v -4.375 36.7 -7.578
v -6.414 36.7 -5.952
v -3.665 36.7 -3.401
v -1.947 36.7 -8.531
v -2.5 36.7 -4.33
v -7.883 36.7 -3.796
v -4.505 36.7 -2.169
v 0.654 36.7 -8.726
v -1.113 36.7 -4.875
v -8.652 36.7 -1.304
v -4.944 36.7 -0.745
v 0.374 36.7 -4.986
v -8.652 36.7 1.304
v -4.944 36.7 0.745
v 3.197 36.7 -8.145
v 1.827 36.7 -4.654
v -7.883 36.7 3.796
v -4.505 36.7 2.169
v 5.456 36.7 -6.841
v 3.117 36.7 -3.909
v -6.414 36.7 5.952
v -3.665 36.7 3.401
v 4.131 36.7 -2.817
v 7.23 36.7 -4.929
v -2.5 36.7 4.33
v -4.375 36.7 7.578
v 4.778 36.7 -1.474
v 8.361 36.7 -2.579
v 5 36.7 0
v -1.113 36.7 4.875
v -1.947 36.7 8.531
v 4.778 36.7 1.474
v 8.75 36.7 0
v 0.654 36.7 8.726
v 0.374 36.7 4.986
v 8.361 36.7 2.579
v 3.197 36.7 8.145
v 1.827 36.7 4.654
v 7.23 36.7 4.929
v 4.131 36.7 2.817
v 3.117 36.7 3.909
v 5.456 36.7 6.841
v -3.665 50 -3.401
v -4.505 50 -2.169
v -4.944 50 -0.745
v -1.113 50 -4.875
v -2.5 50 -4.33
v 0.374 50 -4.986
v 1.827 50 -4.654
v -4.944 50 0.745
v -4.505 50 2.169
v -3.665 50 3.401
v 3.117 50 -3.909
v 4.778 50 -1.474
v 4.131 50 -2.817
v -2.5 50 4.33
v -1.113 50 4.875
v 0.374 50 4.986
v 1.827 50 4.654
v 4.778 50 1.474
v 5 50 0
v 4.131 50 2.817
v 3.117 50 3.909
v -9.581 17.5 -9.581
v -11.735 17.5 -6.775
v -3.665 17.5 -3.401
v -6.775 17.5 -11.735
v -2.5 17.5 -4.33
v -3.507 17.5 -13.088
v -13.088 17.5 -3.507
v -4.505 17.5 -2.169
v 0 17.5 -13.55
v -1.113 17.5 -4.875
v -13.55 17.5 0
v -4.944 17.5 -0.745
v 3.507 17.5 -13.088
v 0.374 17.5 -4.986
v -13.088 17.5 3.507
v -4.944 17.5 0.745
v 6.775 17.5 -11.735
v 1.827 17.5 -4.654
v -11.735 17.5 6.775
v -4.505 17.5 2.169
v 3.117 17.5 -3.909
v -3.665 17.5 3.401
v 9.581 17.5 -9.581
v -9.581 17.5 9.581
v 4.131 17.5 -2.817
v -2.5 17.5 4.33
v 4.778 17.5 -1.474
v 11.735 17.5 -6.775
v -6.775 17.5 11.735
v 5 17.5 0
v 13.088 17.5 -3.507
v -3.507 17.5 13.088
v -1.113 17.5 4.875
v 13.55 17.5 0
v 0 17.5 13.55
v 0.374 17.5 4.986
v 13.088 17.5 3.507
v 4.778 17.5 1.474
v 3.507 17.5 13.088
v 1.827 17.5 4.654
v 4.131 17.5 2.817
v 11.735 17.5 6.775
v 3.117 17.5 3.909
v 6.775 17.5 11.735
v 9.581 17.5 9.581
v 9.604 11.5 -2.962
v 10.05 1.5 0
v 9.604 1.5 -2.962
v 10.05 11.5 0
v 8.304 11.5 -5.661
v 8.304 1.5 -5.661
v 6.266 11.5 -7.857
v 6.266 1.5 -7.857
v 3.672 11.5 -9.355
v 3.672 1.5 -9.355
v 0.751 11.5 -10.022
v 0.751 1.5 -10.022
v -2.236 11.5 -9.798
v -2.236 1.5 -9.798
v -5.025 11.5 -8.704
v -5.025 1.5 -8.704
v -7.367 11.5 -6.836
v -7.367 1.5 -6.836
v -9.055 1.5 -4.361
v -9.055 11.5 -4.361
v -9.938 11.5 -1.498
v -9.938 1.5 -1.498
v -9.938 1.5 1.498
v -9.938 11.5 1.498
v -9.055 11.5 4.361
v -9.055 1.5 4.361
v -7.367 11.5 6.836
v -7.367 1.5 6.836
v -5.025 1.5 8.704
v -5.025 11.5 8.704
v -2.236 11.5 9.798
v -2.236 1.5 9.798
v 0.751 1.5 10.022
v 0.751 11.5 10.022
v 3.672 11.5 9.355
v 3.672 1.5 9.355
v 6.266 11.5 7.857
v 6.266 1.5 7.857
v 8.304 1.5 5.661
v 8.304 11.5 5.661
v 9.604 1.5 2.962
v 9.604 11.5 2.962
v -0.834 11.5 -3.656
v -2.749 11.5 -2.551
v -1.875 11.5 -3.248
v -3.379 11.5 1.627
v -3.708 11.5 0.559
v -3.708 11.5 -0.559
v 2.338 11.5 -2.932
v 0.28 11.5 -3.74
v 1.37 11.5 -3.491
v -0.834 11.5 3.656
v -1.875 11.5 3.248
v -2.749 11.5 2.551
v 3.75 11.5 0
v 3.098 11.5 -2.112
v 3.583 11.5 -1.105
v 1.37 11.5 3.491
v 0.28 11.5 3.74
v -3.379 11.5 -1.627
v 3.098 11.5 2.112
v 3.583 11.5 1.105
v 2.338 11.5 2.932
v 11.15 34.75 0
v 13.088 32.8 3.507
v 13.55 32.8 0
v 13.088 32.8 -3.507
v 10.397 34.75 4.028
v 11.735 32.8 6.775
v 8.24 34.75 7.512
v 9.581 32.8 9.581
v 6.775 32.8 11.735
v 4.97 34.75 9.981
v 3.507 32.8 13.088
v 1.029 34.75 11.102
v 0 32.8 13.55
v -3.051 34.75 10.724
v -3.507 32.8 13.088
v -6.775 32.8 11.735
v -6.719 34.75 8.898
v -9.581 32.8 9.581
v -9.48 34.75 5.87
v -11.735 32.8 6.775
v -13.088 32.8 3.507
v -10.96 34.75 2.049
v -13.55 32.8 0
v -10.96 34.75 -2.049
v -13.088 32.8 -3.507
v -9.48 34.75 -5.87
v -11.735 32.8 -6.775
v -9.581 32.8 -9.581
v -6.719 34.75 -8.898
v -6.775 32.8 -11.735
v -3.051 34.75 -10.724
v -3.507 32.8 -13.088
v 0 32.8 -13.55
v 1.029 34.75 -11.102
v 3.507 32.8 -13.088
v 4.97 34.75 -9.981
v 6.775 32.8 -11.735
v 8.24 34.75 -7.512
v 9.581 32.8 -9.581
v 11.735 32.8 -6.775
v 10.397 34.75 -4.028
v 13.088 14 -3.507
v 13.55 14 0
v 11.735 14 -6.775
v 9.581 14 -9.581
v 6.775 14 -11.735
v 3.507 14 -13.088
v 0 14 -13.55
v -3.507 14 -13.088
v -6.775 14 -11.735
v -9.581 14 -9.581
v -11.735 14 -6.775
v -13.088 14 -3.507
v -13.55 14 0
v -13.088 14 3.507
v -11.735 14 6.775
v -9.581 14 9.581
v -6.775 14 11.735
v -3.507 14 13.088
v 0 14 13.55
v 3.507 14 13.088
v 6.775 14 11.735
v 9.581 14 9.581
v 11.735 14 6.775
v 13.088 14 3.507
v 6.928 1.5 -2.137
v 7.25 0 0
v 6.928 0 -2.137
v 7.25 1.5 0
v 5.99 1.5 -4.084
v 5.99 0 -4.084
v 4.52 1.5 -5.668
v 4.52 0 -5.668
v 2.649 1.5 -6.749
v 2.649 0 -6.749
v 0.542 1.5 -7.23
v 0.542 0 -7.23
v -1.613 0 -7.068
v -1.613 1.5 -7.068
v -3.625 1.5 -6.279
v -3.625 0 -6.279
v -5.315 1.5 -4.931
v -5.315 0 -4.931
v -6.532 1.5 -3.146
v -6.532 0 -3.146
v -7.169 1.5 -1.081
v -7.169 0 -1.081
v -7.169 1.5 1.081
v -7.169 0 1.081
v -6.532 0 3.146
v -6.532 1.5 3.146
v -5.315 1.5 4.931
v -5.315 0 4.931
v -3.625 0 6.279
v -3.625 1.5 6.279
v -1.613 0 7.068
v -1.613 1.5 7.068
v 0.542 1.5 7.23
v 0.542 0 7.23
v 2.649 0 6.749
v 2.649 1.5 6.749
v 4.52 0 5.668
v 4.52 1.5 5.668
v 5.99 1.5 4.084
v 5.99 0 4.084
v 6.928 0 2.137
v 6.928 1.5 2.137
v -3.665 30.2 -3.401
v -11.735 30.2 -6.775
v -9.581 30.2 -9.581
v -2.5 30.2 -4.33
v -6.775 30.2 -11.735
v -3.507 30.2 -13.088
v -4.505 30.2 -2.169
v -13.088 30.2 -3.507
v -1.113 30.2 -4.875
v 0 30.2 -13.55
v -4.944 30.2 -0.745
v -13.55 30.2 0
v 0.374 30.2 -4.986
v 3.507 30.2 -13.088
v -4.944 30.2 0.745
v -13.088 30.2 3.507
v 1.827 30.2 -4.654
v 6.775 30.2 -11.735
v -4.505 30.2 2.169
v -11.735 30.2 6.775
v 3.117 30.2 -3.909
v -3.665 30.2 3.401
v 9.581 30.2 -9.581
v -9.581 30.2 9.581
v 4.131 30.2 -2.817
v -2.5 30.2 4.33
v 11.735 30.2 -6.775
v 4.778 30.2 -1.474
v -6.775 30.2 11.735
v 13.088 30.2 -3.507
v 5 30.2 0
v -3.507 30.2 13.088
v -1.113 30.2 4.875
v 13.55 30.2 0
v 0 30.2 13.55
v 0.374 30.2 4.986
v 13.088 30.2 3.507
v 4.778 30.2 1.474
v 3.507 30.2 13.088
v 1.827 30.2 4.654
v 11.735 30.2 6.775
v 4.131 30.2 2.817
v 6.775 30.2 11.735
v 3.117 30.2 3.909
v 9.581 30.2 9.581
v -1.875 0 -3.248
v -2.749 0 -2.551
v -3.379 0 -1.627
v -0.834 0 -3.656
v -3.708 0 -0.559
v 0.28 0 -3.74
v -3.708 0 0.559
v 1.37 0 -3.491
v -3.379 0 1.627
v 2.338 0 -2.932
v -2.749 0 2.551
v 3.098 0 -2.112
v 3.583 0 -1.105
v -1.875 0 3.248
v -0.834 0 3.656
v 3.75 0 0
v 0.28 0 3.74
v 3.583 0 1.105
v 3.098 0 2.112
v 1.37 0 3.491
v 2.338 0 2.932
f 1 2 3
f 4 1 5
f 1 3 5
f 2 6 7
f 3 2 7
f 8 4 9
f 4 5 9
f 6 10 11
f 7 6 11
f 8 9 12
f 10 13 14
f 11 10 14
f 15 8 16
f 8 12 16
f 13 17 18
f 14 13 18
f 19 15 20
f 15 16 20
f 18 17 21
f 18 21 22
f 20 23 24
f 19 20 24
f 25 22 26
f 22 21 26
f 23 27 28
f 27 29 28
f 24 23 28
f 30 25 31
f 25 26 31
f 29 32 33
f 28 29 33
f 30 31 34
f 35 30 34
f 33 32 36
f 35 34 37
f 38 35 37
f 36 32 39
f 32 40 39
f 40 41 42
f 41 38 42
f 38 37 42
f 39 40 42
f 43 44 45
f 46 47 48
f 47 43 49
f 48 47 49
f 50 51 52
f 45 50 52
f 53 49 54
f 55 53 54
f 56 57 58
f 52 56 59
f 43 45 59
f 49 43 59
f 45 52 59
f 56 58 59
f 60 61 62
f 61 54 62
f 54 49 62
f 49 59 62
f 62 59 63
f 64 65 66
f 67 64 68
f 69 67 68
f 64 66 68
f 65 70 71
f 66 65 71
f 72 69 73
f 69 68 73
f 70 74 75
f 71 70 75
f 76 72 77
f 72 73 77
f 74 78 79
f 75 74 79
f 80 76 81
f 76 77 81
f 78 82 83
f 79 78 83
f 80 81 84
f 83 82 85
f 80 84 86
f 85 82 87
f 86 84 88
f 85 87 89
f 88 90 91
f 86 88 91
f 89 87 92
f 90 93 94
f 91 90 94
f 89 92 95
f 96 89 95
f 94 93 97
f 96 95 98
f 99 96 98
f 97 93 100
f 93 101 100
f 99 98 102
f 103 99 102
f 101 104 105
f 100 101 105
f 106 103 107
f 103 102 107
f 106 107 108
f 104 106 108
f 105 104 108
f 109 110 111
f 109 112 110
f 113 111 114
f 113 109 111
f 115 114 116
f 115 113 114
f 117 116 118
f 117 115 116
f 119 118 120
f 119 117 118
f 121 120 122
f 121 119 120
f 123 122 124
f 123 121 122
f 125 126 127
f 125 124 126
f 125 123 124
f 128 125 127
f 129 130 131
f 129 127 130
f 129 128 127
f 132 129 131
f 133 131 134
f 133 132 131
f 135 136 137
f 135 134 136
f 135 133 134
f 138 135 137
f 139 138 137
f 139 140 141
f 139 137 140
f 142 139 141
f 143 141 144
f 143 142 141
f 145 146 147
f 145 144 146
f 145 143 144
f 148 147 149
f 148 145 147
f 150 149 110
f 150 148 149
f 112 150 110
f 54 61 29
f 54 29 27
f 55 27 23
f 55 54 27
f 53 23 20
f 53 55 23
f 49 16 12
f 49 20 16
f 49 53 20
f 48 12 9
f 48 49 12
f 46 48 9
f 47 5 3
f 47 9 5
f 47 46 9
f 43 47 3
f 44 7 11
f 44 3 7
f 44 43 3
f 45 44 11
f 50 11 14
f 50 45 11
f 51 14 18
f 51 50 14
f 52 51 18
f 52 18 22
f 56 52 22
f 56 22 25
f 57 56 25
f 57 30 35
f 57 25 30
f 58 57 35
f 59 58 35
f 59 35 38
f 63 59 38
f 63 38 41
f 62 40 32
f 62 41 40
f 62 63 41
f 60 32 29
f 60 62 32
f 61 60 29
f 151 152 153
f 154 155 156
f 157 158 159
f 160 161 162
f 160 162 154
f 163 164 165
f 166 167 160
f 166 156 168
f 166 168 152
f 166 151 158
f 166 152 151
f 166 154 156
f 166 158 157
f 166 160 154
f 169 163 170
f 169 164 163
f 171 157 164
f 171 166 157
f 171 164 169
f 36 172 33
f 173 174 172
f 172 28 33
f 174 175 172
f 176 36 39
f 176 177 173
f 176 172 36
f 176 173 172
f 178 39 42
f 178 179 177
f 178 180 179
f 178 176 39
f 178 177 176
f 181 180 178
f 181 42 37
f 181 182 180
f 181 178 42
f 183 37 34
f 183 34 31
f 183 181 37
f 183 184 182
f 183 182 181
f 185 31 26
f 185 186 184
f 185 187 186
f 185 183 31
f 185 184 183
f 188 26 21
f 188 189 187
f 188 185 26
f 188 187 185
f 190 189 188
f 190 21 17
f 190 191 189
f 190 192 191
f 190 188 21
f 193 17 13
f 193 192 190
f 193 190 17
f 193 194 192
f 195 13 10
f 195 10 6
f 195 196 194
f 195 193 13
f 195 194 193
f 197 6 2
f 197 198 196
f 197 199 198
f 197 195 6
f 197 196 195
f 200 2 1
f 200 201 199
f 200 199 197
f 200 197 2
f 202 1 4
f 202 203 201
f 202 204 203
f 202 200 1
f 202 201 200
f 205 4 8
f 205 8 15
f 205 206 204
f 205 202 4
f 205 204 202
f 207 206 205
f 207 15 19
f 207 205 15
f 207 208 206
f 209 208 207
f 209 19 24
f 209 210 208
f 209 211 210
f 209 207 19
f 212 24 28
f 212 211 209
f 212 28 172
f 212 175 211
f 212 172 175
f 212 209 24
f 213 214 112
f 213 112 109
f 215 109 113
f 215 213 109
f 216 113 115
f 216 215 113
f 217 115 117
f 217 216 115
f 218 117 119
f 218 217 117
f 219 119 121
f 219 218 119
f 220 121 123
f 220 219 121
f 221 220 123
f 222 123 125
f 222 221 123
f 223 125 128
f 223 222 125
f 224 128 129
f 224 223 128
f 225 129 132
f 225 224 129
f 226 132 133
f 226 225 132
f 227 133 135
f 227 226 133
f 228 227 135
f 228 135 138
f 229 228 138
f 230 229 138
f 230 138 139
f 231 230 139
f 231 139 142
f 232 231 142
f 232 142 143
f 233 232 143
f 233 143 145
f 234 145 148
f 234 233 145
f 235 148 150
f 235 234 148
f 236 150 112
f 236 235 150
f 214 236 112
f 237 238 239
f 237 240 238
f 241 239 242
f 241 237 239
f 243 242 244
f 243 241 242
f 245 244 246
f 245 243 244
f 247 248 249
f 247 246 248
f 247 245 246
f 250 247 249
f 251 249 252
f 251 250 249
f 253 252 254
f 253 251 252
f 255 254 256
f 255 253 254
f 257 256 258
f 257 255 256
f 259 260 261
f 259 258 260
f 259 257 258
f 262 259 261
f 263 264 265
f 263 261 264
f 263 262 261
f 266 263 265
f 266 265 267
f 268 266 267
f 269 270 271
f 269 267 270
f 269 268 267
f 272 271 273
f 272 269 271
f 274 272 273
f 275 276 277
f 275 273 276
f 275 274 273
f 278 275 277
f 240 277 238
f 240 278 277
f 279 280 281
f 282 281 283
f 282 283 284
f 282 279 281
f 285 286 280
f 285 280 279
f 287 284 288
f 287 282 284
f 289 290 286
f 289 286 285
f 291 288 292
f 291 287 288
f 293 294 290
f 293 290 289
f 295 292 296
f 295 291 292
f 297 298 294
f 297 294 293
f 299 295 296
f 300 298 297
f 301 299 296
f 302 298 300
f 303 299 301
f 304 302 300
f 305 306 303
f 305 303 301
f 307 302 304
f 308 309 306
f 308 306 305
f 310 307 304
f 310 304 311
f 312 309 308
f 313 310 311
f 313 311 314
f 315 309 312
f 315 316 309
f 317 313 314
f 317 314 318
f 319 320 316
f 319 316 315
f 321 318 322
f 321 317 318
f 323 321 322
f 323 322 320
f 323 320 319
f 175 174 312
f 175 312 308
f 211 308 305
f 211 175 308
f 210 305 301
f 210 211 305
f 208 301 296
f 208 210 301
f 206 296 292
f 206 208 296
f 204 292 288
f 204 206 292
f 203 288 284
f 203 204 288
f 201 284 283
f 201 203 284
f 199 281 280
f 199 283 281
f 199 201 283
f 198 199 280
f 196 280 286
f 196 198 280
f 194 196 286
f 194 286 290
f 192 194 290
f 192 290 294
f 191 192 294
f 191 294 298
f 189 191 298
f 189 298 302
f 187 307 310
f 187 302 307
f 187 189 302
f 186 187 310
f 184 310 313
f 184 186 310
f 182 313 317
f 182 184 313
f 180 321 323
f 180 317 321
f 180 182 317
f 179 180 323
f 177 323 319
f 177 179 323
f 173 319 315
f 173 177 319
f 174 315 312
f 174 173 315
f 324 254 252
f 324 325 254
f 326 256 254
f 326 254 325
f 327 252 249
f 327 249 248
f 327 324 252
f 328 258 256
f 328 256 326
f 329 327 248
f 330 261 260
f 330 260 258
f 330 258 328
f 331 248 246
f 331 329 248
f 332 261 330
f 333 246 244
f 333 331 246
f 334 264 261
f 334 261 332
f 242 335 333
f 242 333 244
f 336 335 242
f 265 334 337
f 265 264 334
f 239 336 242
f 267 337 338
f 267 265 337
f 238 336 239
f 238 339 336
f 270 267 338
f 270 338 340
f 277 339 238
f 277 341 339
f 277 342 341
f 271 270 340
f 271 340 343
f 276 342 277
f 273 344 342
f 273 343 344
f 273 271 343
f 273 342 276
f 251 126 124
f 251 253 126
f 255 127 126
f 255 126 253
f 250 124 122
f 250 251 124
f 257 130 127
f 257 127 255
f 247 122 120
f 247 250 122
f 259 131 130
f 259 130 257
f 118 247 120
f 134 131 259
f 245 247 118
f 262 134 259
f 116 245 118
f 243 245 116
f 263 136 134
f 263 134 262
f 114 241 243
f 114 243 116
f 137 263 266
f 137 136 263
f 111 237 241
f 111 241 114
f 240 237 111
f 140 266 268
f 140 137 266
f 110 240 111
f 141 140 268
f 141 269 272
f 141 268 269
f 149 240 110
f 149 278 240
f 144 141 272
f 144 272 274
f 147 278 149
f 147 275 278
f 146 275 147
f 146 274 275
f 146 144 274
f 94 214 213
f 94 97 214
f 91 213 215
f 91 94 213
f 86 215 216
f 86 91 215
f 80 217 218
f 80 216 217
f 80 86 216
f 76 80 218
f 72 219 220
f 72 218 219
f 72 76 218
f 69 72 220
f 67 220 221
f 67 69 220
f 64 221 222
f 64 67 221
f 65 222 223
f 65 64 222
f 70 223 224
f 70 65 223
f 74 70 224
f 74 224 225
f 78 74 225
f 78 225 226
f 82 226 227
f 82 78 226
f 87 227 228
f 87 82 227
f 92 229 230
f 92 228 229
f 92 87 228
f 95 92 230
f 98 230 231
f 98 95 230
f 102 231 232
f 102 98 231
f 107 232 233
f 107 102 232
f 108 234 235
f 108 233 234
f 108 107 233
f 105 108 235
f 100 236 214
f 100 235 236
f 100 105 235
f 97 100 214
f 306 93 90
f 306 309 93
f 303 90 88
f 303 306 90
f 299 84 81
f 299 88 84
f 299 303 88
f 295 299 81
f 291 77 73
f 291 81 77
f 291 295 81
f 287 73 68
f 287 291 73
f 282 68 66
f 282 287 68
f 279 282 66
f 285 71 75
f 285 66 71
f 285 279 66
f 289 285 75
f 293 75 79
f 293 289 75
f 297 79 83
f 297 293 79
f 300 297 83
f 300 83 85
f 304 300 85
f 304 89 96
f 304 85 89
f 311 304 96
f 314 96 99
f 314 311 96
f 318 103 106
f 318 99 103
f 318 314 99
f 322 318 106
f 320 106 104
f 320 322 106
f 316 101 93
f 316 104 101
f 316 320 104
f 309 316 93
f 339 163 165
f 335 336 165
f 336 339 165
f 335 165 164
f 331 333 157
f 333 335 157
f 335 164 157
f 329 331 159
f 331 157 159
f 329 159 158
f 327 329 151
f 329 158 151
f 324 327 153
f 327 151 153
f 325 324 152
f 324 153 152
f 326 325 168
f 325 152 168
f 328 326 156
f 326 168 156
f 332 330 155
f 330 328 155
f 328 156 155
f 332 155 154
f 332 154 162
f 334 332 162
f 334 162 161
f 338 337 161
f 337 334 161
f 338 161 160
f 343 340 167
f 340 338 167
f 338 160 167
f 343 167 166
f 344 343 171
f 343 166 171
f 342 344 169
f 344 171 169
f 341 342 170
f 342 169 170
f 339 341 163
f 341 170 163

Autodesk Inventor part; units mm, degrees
ref_plane "YZ Plane" through (0, 0, 0) normal (1, 0, 0) x (0, 1, 0)
ref_plane "XZ Plane" through (0, 0, 0) normal (0, 1, 0) x (-1, 0, 0)
ref_plane "XY Plane" through (0, 0, 0) normal (0, 0, 1) x (1, 0, 0)
sketch "Sketch1" plane through (0, 0, 0) normal (0, 0, 1) x (1, 0, 0)
  line L0 (3.75, 0) -> (7.25, 0)
  line L1 (7.25, 0) -> (7.25, 1.5)
  line L2 (7.25, 1.5) -> (10.05, 1.5)
  line L3 (10.05, 1.5) -> (10.05, 11.5)
  line L4 (10.05, 11.5) -> (13.55, 14)
  line L5 (13.55, 14) -> (13.55, 17.5)
  line L6 (13.55, 17.5) -> (5, 17.5)
  line L7 (5, 17.5) -> (5, 30.2)
  line L8 (5, 30.2) -> (13.55, 30.2)
  line L9 (13.55, 30.2) -> (13.55, 32.8)
  line L10 (13.55, 32.8) -> (8.75, 36.7)
  line L11 (8.75, 36.7) -> (5, 36.7)
  line L12 (5, 36.7) -> (5, 50)
  line L13 (5, 50) -> (0, 50)
  line L14 (0, 50) -> (0, 11.5)
  line L15 (3.75, 0) -> (3.75, 11.5)
  line L16 (3.75, 11.5) -> (0, 11.5)
  point P0 (0, 0)
  point P1 (2.5, 50)
  point P2 (1.875, 11.5)
  dimension "d0" = 3.75
  dimension "d1" = 3.5
  dimension "d2" = 1.5
  dimension "d3" = 2.8
  dimension "d4" = 10
  dimension "d5" = 3.5
  dimension "d6" = 2.5
  dimension "d7" = 3.5
  dimension "d8" = 5
  dimension "d9" = 12.7
  dimension "d10" = 2.6
  dimension "d11" = 3.9
  dimension "d12" = 4.8
  dimension "d13" = 50
revolve "Revolution1" add sketch "Sketch1" angle 360 about axis through (0, 50, 0) along (0, -1, 0)
properties part number "Drive Motor Shaft Coupler" material "Aluminum 6061"
